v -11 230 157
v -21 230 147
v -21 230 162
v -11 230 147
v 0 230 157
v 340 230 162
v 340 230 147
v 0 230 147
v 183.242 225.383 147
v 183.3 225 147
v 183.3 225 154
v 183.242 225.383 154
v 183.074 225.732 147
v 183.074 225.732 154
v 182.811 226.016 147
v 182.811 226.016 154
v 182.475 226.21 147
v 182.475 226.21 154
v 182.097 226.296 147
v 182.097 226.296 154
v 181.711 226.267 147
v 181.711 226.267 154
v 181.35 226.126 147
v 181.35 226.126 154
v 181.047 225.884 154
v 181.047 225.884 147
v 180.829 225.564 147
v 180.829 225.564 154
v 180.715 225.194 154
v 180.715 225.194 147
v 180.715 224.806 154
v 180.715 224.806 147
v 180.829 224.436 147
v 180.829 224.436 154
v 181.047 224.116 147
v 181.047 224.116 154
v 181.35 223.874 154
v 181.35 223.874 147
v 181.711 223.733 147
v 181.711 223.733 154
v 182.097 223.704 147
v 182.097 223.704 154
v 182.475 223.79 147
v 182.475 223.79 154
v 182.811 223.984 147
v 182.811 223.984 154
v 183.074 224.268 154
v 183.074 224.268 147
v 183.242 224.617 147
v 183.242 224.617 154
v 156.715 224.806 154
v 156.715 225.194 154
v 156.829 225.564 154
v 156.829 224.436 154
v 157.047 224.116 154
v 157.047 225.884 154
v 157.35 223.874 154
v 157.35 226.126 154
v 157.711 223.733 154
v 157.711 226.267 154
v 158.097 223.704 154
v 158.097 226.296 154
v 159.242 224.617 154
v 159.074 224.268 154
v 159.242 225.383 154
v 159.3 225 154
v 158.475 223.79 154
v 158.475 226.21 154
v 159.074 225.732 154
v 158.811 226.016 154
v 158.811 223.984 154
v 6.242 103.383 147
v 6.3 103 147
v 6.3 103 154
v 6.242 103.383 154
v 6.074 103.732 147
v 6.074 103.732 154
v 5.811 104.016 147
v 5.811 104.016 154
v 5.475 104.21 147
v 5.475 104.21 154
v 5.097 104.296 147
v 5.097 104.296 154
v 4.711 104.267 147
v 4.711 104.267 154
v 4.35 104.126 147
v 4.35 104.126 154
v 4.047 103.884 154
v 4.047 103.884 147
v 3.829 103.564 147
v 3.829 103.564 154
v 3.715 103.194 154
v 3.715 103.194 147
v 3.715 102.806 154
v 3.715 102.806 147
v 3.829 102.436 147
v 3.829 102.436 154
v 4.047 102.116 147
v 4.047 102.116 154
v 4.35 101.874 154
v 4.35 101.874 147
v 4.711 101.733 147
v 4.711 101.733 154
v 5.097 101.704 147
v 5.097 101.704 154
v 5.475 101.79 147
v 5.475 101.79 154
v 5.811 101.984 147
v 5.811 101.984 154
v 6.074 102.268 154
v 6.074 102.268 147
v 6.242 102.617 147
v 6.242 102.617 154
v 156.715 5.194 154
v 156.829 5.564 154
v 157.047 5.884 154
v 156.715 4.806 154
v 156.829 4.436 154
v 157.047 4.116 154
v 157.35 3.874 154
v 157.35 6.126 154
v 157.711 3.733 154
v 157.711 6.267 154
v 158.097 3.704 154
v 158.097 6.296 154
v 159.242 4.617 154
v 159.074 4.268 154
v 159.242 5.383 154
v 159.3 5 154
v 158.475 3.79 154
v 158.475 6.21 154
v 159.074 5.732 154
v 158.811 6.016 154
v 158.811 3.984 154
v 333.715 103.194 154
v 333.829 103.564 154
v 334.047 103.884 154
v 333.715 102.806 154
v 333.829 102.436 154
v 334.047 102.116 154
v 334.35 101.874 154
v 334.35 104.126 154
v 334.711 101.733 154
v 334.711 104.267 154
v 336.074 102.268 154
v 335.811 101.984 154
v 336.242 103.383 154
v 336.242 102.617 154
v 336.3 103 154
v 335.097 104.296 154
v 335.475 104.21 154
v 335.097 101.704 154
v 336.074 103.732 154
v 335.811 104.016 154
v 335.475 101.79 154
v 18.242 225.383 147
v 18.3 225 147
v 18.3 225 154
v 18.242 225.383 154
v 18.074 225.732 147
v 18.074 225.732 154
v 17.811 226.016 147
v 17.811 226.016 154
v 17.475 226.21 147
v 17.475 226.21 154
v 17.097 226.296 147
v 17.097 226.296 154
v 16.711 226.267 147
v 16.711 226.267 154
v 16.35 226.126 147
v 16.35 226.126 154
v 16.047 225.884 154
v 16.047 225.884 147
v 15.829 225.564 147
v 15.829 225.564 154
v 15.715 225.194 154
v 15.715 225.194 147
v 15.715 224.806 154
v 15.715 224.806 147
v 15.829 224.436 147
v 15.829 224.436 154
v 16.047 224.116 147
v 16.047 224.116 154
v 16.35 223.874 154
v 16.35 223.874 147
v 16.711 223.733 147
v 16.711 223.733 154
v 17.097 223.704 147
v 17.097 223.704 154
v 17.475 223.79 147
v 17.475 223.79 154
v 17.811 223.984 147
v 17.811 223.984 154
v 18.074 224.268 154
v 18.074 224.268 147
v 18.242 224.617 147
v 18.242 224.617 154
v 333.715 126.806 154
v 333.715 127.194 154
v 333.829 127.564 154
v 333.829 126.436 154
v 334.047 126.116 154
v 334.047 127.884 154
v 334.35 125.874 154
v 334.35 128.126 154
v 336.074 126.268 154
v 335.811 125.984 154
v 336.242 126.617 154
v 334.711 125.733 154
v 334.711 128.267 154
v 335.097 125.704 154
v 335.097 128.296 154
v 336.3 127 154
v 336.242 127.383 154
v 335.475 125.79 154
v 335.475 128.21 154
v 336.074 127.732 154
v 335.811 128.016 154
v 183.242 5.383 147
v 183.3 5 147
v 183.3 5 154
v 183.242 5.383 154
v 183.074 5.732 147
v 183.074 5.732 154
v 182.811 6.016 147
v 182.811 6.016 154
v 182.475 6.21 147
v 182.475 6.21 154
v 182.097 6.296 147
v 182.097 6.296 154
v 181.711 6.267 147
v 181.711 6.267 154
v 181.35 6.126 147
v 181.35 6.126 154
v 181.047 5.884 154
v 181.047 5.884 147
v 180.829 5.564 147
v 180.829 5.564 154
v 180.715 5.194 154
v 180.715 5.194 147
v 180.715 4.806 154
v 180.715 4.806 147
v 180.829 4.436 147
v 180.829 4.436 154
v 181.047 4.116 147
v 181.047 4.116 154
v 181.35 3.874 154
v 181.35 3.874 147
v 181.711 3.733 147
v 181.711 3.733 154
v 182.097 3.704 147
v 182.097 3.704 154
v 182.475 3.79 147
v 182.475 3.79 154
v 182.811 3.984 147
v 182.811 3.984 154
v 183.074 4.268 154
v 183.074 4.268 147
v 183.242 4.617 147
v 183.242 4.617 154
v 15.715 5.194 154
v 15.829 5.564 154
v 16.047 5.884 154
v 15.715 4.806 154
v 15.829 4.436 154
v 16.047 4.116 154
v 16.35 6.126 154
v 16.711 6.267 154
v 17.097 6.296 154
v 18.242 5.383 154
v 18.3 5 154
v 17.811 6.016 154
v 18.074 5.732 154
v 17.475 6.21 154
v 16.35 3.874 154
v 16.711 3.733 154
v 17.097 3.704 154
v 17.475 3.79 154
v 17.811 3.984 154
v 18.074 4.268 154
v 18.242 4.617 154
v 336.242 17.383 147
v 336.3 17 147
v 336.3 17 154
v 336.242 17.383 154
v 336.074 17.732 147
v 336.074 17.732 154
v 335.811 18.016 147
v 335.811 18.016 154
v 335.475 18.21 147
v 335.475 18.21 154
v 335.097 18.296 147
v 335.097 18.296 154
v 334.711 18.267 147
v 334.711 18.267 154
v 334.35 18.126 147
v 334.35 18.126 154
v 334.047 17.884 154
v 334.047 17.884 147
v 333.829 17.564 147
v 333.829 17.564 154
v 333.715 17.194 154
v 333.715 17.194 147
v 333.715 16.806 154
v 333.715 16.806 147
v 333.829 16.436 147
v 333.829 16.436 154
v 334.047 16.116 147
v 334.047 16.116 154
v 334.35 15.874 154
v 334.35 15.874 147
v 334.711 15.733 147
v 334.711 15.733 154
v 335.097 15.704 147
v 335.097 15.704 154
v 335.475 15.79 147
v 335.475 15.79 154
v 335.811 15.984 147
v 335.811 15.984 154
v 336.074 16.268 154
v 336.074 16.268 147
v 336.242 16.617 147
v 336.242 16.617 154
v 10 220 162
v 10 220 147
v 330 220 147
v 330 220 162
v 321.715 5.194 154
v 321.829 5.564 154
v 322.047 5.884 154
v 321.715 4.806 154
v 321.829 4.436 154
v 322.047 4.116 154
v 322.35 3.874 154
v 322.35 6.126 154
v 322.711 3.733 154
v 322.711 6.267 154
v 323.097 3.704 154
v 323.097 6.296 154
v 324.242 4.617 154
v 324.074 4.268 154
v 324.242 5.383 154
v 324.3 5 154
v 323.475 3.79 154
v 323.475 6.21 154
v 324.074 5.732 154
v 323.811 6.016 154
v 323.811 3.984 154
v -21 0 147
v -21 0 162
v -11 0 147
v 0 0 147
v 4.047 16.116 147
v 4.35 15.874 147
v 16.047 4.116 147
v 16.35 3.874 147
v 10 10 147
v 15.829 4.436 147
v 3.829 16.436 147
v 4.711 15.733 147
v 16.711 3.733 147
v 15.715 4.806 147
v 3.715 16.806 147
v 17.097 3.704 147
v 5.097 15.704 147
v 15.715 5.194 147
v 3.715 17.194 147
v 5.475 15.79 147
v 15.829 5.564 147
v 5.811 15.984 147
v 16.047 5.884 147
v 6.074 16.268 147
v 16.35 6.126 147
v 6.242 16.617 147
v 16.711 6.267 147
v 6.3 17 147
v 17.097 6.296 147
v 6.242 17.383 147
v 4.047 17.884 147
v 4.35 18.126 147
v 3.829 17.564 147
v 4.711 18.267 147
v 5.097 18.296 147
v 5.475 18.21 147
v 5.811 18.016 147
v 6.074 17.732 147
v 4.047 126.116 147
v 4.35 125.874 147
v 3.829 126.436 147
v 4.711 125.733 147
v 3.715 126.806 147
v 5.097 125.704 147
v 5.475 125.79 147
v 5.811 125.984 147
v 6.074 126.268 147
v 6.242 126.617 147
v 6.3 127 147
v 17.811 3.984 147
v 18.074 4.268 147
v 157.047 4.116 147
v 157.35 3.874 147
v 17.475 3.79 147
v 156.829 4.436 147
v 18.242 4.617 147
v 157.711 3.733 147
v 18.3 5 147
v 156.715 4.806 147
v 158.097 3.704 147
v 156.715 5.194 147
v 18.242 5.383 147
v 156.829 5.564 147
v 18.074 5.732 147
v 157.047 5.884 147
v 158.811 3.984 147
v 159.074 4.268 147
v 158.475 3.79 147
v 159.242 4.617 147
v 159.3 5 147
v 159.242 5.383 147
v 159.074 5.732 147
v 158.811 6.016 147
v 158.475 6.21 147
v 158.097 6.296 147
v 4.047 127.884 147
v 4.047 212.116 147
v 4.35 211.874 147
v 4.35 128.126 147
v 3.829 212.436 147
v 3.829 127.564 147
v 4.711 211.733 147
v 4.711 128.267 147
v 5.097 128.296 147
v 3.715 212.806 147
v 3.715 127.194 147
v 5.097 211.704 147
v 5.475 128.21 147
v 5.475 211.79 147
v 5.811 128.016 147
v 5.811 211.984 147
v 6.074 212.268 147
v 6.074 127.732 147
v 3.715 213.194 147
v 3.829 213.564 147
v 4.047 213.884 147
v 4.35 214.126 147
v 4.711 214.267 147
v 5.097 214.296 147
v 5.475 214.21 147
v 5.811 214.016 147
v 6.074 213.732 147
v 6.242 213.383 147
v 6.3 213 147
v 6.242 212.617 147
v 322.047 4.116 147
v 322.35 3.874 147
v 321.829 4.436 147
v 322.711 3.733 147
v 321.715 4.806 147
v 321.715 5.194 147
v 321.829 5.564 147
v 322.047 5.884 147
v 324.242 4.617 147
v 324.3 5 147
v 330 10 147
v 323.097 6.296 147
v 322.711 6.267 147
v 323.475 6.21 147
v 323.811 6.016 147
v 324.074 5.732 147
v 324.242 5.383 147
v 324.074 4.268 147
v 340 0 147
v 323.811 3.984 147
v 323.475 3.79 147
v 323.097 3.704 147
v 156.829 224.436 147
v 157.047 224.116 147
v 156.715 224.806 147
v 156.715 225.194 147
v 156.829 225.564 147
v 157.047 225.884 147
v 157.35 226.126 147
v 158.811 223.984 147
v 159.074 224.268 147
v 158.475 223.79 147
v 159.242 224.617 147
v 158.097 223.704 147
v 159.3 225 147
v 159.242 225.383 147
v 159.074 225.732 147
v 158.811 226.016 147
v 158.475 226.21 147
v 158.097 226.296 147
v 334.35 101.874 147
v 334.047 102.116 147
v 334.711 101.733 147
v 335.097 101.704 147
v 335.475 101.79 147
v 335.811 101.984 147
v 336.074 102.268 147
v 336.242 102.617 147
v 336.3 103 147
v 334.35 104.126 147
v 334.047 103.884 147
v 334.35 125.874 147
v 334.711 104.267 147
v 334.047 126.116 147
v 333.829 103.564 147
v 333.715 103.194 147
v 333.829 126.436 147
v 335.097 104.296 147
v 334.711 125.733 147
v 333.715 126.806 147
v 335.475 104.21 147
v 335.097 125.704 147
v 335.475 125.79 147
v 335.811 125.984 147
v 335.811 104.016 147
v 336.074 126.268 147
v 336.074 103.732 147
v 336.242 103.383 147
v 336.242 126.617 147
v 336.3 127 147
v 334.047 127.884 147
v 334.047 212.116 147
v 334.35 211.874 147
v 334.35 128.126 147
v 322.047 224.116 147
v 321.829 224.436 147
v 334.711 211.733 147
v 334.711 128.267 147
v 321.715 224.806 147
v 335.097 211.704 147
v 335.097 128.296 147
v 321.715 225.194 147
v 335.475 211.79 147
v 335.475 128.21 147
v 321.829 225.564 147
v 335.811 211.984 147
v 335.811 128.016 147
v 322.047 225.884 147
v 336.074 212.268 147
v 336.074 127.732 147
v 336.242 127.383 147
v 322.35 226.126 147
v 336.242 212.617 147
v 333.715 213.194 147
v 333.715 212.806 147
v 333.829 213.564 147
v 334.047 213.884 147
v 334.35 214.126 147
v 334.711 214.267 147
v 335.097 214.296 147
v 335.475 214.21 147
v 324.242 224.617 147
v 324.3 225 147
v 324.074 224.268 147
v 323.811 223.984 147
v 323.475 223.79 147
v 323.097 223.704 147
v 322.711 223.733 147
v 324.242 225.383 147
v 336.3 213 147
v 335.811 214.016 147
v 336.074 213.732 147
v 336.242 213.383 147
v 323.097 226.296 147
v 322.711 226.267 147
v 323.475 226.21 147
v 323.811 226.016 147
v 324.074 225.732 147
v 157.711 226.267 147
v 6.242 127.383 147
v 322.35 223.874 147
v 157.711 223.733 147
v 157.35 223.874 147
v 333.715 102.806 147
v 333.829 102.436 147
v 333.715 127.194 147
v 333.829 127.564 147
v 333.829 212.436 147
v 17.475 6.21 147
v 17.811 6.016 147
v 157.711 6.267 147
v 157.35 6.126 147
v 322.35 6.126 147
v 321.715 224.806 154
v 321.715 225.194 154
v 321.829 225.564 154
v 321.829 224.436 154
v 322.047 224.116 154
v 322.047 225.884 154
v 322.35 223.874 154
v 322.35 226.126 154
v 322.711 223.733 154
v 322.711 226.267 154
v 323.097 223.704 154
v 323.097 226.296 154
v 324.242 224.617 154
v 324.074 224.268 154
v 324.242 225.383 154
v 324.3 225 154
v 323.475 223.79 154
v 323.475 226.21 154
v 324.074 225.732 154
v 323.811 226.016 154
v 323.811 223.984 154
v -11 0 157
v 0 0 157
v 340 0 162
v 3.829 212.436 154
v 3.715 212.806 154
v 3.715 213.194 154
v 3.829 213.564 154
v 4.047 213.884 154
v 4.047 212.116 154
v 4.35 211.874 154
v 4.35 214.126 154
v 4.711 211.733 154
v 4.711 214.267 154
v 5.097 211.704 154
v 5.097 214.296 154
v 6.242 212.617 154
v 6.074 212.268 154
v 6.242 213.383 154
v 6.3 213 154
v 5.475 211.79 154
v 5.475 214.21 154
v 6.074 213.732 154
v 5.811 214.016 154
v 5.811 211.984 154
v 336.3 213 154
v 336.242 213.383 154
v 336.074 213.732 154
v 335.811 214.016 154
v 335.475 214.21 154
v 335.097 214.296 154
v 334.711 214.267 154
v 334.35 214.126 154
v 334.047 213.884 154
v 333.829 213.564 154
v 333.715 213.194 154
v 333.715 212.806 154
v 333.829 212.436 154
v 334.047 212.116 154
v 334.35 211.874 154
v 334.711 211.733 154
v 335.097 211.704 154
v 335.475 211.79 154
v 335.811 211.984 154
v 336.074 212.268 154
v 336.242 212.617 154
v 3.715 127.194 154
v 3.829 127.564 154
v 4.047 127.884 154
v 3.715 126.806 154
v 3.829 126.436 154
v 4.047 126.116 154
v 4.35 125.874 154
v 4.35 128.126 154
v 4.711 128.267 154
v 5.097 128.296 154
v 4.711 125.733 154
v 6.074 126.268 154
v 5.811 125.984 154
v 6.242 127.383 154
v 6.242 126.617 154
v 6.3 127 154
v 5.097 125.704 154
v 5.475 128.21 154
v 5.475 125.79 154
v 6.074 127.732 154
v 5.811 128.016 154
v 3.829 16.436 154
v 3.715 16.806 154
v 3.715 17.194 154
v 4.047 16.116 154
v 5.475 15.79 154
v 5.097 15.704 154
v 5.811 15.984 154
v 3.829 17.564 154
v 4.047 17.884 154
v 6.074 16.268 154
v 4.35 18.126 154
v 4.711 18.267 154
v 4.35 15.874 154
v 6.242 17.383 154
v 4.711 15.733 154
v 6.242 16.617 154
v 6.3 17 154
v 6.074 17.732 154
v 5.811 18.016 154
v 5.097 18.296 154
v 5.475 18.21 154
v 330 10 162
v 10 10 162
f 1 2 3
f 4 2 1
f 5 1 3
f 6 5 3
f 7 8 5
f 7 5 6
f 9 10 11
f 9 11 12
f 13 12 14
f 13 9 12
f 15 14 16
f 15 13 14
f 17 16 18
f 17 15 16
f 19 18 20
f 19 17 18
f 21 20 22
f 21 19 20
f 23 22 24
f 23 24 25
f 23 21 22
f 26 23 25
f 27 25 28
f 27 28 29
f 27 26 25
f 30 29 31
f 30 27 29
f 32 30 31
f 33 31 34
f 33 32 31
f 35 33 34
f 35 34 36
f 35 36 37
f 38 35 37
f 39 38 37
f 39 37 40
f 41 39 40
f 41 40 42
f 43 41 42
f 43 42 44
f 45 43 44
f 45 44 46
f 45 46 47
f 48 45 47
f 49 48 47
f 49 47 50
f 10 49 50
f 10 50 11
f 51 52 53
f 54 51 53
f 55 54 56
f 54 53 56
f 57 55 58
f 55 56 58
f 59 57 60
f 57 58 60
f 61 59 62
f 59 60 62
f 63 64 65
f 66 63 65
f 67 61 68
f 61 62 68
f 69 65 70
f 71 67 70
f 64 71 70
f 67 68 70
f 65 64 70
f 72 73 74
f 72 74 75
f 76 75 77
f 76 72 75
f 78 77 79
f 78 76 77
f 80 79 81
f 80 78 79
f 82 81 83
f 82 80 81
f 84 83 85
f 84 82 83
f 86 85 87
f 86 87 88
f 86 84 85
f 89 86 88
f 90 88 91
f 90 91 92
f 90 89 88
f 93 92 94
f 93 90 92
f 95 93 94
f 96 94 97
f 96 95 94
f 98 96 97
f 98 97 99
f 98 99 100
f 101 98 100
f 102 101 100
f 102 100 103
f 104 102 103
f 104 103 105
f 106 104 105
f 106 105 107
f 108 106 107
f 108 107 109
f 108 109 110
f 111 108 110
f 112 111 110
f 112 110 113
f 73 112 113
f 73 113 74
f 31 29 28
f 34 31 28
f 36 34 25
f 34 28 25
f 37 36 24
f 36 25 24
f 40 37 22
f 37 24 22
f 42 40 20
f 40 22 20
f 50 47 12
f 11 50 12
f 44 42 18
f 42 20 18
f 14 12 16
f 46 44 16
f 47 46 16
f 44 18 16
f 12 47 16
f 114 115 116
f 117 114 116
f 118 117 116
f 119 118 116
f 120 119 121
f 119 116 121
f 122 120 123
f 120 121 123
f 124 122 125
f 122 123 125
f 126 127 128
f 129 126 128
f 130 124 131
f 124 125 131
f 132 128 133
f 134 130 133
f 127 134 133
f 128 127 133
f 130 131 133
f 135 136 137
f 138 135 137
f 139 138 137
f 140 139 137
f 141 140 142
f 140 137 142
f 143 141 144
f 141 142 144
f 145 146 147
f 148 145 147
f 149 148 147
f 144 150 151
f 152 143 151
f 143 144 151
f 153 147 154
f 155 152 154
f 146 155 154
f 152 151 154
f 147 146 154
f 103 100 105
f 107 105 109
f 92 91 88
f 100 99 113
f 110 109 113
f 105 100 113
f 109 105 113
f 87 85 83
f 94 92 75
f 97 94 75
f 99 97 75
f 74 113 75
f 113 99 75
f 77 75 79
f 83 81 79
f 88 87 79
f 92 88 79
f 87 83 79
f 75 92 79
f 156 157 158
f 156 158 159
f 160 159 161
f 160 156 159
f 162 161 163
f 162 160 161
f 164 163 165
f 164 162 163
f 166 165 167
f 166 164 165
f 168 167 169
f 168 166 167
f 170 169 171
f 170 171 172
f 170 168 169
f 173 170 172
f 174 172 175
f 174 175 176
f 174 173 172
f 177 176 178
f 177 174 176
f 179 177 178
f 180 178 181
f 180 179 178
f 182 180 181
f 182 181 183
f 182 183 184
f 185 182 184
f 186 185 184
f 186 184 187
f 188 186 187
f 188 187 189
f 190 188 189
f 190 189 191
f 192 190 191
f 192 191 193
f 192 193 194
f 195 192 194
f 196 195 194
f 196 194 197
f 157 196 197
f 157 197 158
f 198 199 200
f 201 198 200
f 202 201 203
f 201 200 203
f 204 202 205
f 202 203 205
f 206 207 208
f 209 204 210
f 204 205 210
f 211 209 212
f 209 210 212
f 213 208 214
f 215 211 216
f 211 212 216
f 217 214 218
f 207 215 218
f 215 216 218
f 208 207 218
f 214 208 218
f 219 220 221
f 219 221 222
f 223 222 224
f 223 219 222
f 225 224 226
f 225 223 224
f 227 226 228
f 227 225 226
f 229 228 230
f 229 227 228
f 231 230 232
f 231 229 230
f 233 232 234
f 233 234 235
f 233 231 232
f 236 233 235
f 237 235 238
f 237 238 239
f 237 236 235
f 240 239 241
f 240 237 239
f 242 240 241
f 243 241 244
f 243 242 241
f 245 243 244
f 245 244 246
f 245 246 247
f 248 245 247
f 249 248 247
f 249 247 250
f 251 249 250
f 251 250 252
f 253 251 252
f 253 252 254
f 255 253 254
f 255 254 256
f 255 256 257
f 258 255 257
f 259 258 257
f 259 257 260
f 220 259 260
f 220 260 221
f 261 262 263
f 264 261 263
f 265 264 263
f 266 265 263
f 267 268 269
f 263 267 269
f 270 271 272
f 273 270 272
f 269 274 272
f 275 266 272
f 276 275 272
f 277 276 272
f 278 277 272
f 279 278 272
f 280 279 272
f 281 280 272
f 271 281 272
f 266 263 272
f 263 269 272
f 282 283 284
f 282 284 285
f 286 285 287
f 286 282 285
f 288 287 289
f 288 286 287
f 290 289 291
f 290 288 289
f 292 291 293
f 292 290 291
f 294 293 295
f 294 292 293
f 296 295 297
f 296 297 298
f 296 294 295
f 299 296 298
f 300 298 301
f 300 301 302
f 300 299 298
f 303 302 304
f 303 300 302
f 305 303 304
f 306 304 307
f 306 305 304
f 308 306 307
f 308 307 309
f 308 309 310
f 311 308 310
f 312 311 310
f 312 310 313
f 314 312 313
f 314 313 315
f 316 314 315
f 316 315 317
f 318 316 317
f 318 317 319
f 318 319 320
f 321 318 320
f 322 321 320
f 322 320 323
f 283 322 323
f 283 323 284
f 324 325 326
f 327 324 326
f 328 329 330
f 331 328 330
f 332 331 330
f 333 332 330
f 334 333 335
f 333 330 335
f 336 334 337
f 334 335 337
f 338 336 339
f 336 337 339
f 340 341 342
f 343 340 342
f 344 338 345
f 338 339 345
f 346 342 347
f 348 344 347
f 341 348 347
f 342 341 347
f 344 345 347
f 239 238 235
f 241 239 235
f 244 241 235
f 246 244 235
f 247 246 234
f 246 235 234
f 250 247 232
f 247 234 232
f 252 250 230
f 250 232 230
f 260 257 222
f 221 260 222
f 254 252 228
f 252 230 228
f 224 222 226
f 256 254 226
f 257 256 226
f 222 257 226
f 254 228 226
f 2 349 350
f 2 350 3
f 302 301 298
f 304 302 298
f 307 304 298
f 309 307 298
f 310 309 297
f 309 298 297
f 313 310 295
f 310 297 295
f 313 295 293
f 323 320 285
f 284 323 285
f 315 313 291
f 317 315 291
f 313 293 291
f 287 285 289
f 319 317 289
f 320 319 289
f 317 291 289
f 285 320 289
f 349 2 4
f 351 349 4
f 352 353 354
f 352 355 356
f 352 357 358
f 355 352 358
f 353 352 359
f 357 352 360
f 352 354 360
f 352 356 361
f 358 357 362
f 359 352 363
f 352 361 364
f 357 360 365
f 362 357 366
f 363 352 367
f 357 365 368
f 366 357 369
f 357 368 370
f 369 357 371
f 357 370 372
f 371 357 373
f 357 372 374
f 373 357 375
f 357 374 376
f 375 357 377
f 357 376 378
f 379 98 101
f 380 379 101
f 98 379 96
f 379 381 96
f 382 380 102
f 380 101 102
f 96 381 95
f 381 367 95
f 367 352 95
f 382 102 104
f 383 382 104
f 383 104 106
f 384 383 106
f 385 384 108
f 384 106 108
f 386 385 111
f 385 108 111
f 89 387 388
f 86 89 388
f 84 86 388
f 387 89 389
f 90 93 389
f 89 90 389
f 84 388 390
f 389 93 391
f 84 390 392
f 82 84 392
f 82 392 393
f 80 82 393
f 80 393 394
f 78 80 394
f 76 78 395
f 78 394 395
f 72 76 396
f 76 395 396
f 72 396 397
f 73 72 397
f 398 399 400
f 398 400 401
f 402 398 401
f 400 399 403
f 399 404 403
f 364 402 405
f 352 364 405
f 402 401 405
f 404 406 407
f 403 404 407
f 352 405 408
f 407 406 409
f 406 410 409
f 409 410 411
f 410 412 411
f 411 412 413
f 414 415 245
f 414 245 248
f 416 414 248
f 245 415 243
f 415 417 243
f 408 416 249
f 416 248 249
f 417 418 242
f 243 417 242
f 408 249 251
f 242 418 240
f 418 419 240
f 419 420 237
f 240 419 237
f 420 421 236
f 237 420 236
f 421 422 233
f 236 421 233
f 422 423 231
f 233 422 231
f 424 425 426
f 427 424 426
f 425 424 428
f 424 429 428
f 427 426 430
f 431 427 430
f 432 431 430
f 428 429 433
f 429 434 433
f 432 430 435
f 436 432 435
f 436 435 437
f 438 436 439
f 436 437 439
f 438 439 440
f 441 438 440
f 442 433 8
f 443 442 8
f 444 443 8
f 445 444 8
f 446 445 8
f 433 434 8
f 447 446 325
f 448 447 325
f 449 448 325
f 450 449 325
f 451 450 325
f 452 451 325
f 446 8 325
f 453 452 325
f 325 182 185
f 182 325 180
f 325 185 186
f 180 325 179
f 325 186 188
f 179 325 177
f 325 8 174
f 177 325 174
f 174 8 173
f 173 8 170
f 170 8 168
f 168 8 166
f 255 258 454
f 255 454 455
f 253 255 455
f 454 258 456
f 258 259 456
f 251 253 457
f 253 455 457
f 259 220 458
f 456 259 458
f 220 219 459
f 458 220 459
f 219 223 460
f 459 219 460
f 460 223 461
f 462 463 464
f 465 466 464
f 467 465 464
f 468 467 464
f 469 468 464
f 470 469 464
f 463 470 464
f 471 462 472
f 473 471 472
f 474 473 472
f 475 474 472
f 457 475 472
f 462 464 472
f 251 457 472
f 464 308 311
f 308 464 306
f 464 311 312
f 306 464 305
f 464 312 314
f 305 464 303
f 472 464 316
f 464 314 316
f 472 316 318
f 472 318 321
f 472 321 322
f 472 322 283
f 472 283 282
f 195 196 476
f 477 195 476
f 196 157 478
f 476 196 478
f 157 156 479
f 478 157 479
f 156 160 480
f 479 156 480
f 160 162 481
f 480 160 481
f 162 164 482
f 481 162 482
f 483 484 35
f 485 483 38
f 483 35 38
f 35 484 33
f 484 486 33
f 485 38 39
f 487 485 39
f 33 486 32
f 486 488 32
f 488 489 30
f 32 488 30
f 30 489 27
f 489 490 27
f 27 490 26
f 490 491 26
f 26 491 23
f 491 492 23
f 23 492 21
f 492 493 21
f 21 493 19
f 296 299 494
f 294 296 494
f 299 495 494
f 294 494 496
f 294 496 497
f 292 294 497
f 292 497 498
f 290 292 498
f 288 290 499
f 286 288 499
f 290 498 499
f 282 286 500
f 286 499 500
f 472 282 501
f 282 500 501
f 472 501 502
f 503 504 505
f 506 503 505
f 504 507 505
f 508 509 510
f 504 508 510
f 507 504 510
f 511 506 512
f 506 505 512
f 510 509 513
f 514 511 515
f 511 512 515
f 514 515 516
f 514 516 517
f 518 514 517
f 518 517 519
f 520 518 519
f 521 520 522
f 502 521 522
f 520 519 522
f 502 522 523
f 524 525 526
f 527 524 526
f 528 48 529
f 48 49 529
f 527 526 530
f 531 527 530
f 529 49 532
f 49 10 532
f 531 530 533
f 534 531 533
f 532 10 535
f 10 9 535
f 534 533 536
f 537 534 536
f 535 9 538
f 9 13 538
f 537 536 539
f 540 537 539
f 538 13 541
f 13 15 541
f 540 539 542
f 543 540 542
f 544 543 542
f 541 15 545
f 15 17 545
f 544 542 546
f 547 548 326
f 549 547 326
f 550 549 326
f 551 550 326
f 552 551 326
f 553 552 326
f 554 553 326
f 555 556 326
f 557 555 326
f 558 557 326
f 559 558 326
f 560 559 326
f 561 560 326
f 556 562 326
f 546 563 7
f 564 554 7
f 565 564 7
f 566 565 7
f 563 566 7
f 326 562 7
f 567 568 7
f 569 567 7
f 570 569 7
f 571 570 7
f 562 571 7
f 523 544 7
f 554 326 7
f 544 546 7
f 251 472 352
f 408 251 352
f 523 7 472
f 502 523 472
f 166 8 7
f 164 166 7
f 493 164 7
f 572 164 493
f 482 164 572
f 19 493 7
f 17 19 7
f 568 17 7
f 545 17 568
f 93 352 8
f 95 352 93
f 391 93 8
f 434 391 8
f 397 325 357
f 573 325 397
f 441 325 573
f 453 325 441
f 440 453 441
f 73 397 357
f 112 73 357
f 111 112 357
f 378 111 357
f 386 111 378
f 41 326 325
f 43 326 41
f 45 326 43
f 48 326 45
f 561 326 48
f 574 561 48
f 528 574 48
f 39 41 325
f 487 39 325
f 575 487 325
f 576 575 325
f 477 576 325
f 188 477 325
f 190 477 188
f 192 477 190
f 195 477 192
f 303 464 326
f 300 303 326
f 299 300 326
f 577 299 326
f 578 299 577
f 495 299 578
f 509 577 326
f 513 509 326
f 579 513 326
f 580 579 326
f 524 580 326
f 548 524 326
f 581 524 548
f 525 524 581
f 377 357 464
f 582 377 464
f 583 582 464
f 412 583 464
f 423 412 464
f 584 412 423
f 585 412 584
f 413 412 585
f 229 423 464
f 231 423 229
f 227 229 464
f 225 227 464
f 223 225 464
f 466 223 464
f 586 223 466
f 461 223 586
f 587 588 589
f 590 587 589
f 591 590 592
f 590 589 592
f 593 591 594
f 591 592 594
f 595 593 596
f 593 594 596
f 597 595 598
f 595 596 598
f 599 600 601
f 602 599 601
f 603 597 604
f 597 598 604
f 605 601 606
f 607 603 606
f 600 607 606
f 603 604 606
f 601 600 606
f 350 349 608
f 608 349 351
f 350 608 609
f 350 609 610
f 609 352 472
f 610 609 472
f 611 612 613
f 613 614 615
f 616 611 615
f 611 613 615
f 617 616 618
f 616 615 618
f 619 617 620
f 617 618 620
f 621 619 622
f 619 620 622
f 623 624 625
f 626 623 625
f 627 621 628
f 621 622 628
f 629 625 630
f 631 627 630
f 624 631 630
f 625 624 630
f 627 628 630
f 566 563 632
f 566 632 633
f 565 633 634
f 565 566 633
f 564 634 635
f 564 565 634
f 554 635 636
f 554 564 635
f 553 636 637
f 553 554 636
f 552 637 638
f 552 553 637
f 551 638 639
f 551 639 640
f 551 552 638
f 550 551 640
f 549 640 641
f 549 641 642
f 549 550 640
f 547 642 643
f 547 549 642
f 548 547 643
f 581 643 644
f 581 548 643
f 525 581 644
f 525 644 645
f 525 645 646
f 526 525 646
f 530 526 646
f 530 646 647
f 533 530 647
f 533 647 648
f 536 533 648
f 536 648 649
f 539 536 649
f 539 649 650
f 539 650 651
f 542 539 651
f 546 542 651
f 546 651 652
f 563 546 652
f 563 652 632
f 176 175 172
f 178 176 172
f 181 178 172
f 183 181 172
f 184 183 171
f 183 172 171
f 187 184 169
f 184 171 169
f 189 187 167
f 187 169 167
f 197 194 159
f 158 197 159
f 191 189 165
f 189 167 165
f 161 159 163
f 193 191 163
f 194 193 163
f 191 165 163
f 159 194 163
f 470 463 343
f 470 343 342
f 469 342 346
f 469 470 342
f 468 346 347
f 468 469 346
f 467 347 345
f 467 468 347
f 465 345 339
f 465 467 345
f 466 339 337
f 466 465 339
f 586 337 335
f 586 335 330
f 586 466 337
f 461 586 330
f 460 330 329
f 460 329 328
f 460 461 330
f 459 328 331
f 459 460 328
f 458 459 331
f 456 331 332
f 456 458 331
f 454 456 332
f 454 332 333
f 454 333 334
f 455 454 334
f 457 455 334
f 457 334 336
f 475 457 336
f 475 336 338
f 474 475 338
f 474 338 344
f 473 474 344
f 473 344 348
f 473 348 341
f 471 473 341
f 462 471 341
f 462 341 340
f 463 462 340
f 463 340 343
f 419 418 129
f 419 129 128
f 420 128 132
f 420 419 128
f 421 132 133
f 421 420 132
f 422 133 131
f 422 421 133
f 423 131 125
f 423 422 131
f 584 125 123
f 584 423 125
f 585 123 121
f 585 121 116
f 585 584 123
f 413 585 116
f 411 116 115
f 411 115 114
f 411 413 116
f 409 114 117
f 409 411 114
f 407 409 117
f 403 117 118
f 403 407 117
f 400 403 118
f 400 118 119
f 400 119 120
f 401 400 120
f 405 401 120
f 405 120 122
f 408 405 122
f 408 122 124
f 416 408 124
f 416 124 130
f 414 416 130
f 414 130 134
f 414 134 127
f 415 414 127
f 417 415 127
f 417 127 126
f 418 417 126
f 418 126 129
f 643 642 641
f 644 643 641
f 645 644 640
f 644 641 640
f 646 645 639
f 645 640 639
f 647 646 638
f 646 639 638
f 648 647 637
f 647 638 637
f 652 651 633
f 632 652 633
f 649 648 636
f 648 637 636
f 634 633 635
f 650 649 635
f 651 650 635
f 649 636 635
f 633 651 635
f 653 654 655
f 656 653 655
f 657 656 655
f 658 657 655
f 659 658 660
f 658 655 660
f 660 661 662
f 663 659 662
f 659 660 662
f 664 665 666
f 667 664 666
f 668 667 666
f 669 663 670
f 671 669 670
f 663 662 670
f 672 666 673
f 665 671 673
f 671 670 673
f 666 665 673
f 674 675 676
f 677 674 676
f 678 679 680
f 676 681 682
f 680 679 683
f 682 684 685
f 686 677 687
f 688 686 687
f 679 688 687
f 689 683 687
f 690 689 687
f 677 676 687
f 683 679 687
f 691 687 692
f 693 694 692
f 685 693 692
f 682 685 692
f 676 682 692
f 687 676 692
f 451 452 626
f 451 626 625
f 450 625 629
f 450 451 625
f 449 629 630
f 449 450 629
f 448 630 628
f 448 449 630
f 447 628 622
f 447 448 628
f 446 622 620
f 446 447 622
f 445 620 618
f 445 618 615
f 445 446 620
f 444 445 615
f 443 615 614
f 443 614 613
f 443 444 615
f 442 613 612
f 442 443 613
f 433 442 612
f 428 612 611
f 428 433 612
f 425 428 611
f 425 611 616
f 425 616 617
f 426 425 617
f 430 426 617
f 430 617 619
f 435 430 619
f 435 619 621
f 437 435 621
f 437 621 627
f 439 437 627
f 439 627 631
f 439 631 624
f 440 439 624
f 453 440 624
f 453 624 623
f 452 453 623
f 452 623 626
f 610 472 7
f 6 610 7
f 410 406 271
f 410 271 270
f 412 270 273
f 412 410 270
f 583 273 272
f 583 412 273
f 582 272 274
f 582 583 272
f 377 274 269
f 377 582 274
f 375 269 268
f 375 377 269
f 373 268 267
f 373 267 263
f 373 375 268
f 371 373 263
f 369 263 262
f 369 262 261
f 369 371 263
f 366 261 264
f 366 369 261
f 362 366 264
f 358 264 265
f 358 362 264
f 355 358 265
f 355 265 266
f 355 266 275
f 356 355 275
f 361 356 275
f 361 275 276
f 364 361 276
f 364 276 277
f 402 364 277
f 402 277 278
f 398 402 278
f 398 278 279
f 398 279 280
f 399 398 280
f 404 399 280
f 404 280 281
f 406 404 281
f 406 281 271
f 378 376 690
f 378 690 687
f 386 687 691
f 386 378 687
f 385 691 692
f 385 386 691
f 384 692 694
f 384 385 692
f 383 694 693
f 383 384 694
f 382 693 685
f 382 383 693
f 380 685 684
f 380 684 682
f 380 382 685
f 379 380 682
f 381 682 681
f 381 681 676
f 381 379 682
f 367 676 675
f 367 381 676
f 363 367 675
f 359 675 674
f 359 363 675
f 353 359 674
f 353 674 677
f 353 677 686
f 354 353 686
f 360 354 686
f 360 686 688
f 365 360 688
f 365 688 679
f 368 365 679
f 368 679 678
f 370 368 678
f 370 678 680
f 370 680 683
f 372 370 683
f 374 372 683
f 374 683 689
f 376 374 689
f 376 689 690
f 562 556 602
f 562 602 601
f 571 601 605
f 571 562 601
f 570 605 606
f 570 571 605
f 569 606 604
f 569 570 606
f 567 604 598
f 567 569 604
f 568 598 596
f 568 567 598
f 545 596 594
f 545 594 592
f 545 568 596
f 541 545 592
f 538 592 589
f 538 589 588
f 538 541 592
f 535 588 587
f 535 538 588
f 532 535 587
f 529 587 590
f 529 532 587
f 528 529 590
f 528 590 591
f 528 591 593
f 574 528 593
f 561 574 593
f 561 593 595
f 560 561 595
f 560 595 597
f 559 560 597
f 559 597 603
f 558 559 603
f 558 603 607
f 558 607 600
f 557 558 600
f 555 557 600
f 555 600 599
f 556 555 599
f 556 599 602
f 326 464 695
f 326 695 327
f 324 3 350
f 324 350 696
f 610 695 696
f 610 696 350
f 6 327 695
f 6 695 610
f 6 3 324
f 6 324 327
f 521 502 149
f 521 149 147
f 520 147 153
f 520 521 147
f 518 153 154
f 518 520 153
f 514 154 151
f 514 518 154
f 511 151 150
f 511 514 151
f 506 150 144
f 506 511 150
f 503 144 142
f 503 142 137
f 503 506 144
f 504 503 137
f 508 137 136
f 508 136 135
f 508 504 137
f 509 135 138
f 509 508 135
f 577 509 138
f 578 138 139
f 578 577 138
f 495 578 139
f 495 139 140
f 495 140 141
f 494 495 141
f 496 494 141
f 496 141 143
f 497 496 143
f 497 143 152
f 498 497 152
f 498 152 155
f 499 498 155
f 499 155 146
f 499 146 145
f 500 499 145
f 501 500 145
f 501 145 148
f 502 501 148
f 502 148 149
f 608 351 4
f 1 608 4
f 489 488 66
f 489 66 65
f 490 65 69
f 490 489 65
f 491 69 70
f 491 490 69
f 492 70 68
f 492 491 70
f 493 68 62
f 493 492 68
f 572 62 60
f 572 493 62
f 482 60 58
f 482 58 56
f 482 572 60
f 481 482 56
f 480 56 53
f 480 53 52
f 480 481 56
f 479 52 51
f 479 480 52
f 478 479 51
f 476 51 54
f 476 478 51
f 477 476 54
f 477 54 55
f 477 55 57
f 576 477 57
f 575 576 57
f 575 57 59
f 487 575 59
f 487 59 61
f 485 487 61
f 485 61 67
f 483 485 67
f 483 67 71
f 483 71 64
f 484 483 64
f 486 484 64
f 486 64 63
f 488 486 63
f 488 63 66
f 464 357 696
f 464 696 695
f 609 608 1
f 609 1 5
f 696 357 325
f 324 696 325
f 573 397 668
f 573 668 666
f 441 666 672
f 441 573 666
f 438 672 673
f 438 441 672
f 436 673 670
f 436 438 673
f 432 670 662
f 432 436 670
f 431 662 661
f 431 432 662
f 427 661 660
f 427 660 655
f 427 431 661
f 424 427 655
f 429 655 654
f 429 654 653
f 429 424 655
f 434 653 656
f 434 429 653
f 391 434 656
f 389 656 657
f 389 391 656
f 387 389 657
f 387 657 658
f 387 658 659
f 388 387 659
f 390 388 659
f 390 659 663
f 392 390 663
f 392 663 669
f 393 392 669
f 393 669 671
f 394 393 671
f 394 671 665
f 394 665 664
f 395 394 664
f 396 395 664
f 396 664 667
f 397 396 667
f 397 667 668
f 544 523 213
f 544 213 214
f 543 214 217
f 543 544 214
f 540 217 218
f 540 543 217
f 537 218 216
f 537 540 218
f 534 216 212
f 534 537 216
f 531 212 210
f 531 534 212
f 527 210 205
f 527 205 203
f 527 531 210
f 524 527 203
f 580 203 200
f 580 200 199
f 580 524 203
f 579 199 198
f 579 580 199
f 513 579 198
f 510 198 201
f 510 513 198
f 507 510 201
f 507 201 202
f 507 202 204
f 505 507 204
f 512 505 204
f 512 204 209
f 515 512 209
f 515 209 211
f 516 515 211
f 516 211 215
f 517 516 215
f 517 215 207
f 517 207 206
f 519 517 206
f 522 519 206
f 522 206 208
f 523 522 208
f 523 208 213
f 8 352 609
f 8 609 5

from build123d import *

# Parameters (mm, degrees)
CYLINDER047_R     = 1.3
CYLINDER047_DEPTH = 146
CYLINDER045_R     = 1.3
CYLINDER045_DEPTH = 146
CYLINDER043_R     = 1.3
CYLINDER043_DEPTH = 146
CYLINDER040_R     = 1.3
CYLINDER040_DEPTH = 146
CYLINDER039_R     = 1.3
CYLINDER039_DEPTH = 146
CYLINDER036_R     = 1.3
CYLINDER036_DEPTH = 146
CYLINDER034_R     = 1.3
CYLINDER034_DEPTH = 146
CYLINDER032_R     = 1.3
CYLINDER032_DEPTH = 146
CYLINDER030_R     = 1.3
CYLINDER030_DEPTH = 146
CYLINDER018_R     = 1.3
CYLINDER018_DEPTH = 146
CYLINDER017_R     = 1.3
CYLINDER017_DEPTH = 146
CYLINDER012_R     = 1.3
CYLINDER012_DEPTH = 146
CYLINDER011_R     = 1.3
CYLINDER011_DEPTH = 146
CYLINDER009_R     = 1.3
CYLINDER009_DEPTH = 146
CYLINDER002_R     = 1.3
CYLINDER002_DEPTH = 146
CYLINDER001_R     = 1.3
CYLINDER001_DEPTH = 146
BOX046_W          = 10
BOX046_H          = 230
BOX046_DEPTH      = 10
BOX041_W          = 10
BOX041_H          = 210
BOX041_DEPTH      = 15
BOX040_W          = 340
BOX040_H          = 10
BOX040_DEPTH      = 15
BOX024_W          = 10
BOX024_H          = 210
BOX024_DEPTH      = 15
BOX042_W          = 340
BOX042_H          = 10
BOX042_DEPTH      = 15
BOX045_W          = 21
BOX045_H          = 230
BOX045_DEPTH      = 5


with BuildPart() as cilindro047:
    # Cylinder047 → Cylinder047 (new body)
    with BuildSketch(Plane(origin=(5, 103, 8), x_dir=(1, 0, 0), z_dir=(0, 0, 1))):
        Circle(CYLINDER047_R)
    extrude(amount=CYLINDER047_DEPTH)


with BuildPart() as cilindro045:
    # Cylinder045 → Cylinder045 (new body)
    with BuildSketch(Plane(origin=(5, 127, 8), x_dir=(1, 0, 0), z_dir=(0, 0, 1))):
        Circle(CYLINDER045_R)
    extrude(amount=CYLINDER045_DEPTH)


with BuildPart() as cilindro043:
    # Cylinder043 → Cylinder043 (new body)
    with BuildSketch(Plane(origin=(5, 213, 8), x_dir=(1, 0, 0), z_dir=(0, 0, 1))):
        Circle(CYLINDER043_R)
    extrude(amount=CYLINDER043_DEPTH)


with BuildPart() as cilindro040:
    # Cylinder040 → Cylinder040 (new body)
    with BuildSketch(Plane(origin=(17, 225, 8), x_dir=(1, 0, 0), z_dir=(0, 0, 1))):
        Circle(CYLINDER040_R)
    extrude(amount=CYLINDER040_DEPTH)


with BuildPart() as cilindro039:
    # Cylinder039 → Cylinder039 (new body)
    with BuildSketch(Plane(origin=(158, 225, 8), x_dir=(1, 0, 0), z_dir=(0, 0, 1))):
        Circle(CYLINDER039_R)
    extrude(amount=CYLINDER039_DEPTH)


with BuildPart() as cilindro036:
    # Cylinder036 → Cylinder036 (new body)
    with BuildSketch(Plane(origin=(182, 225, 8), x_dir=(1, 0, 0), z_dir=(0, 0, 1))):
        Circle(CYLINDER036_R)
    extrude(amount=CYLINDER036_DEPTH)


with BuildPart() as cilindro034:
    # Cylinder034 → Cylinder034 (new body)
    with BuildSketch(Plane(origin=(323, 225, 8), x_dir=(1, 0, 0), z_dir=(0, 0, 1))):
        Circle(CYLINDER034_R)
    extrude(amount=CYLINDER034_DEPTH)


with BuildPart() as cilindro032:
    # Cylinder032 → Cylinder032 (new body)
    with BuildSketch(Plane(origin=(335, 213, 8), x_dir=(1, 0, 0), z_dir=(0, 0, 1))):
        Circle(CYLINDER032_R)
    extrude(amount=CYLINDER032_DEPTH)


with BuildPart() as cilindro030:
    # Cylinder030 → Cylinder030 (new body)
    with BuildSketch(Plane(origin=(335, 127, 8), x_dir=(1, 0, 0), z_dir=(0, 0, 1))):
        Circle(CYLINDER030_R)
    extrude(amount=CYLINDER030_DEPTH)


with BuildPart() as cilindro018:
    # Cylinder018 → Cylinder018 (new body)
    with BuildSketch(Plane(origin=(335, 103, 8), x_dir=(1, 0, 0), z_dir=(0, 0, 1))):
        Circle(CYLINDER018_R)
    extrude(amount=CYLINDER018_DEPTH)


with BuildPart() as cilindro017:
    # Cylinder017 → Cylinder017 (new body)
    with BuildSketch(Plane(origin=(335, 17, 8), x_dir=(1, 0, 0), z_dir=(0, 0, 1))):
        Circle(CYLINDER017_R)
    extrude(amount=CYLINDER017_DEPTH)


with BuildPart() as cilindro012:
    # Cylinder012 → Cylinder012 (new body)
    with BuildSketch(Plane(origin=(323, 5, 8), x_dir=(1, 0, 0), z_dir=(0, 0, 1))):
        Circle(CYLINDER012_R)
    extrude(amount=CYLINDER012_DEPTH)


with BuildPart() as cilindro011:
    # Cylinder011 → Cylinder011 (new body)
    with BuildSketch(Plane(origin=(182, 5, 8), x_dir=(1, 0, 0), z_dir=(0, 0, 1))):
        Circle(CYLINDER011_R)
    extrude(amount=CYLINDER011_DEPTH)


with BuildPart() as cilindro009:
    # Cylinder009 → Cylinder009 (new body)
    with BuildSketch(Plane(origin=(158, 5, 8), x_dir=(1, 0, 0), z_dir=(0, 0, 1))):
        Circle(CYLINDER009_R)
    extrude(amount=CYLINDER009_DEPTH)


with BuildPart() as cilindro002:
    # Cylinder002 → Cylinder002 (new body)
    with BuildSketch(Plane(origin=(5, 17, 8), x_dir=(1, 0, 0), z_dir=(0, 0, 1))):
        Circle(CYLINDER002_R)
    extrude(amount=CYLINDER002_DEPTH)


with BuildPart() as cilindro001:
    # Cylinder001 → Cylinder001 (new body)
    with BuildSketch(Plane(origin=(17, 5, 8), x_dir=(1, 0, 0), z_dir=(0, 0, 1))):
        Circle(CYLINDER001_R)
    extrude(amount=CYLINDER001_DEPTH)


with BuildPart() as cubo009:
    # Box046 → Box046 (new body)
    with BuildSketch(Plane(origin=(-21, 249, 0), x_dir=(1, 0, 0), z_dir=(0, 0, 1))):
        with Locations((5, 115)):
            Rectangle(BOX046_W, BOX046_H)
    extrude(amount=BOX046_DEPTH)


with BuildPart() as cubo004:
    # Box041 → Box041 (new body)
    with BuildSketch(Plane(origin=(330, 259, 0), x_dir=(1, 0, 0), z_dir=(0, 0, 1))):
        with Locations((5, 105)):
            Rectangle(BOX041_W, BOX041_H)
    extrude(amount=BOX041_DEPTH)


with BuildPart() as cubo003:
    # Box040 → Box040 (new body)
    with BuildSketch(Plane(origin=(0, 249, 0), x_dir=(1, 0, 0), z_dir=(0, 0, 1))):
        with Locations((170, 5)):
            Rectangle(BOX040_W, BOX040_H)
    extrude(amount=BOX040_DEPTH)


with BuildPart() as cubo002:
    # Box024 → Box024 (new body)
    with BuildSketch(Plane(origin=(0, 259, 0), x_dir=(1, 0, 0), z_dir=(0, 0, 1))):
        with Locations((5, 105)):
            Rectangle(BOX024_W, BOX024_H)
    extrude(amount=BOX024_DEPTH)


with BuildPart() as techo:
    # Box042 → Box042 (new body)
    with BuildSketch(Plane(origin=(0, 469, 0), x_dir=(1, 0, 0), z_dir=(0, 0, 1))):
        with Locations((170, 5)):
            Rectangle(BOX042_W, BOX042_H)
    extrude(amount=BOX042_DEPTH)

    # Fusion004: union Cubo004, Cubo003, Cubo002
    add(cubo004.part)
    add(cubo003.part)
    add(cubo002.part)


with BuildPart() as cut062:
    # Box045 → Box045 (new body)
    with BuildSketch(Plane(origin=(-21, 249, 10), x_dir=(1, 0, 0), z_dir=(0, 0, 1))):
        with Locations((10.5, 115)):
            Rectangle(BOX045_W, BOX045_H)
    extrude(amount=BOX045_DEPTH)

    # Fusion005: union Cubo009, techo
    add(cubo009.part)
    add(techo.part)


with BuildPart() as cut062_1:
    # Fusion005 placement: moved
    add(cut062.part.moved(Location((0, -249, 147))))

    # Cut016: cut Cilindro001
    add(cilindro001.part, mode=Mode.SUBTRACT)

    # Cut017: cut Cilindro002
    add(cilindro002.part, mode=Mode.SUBTRACT)

    # Cut023: cut Cilindro009
    add(cilindro009.part, mode=Mode.SUBTRACT)

    # Cut026: cut Cilindro011
    add(cilindro011.part, mode=Mode.SUBTRACT)

    # Cut029: cut Cilindro012
    add(cilindro012.part, mode=Mode.SUBTRACT)

    # Cut032: cut Cilindro017
    add(cilindro017.part, mode=Mode.SUBTRACT)

    # Cut043: cut Cilindro018
    add(cilindro018.part, mode=Mode.SUBTRACT)

    # Cut045: cut Cilindro030
    add(cilindro030.part, mode=Mode.SUBTRACT)

    # Cut047: cut Cilindro032
    add(cilindro032.part, mode=Mode.SUBTRACT)

    # Cut049: cut Cilindro034
    add(cilindro034.part, mode=Mode.SUBTRACT)

    # Cut051: cut Cilindro036
    add(cilindro036.part, mode=Mode.SUBTRACT)

    # Cut054: cut Cilindro039
    add(cilindro039.part, mode=Mode.SUBTRACT)

    # Cut055: cut Cilindro040
    add(cilindro040.part, mode=Mode.SUBTRACT)

    # Cut058: cut Cilindro043
    add(cilindro043.part, mode=Mode.SUBTRACT)

    # Cut060: cut Cilindro045
    add(cilindro045.part, mode=Mode.SUBTRACT)

    # Cut062: cut Cilindro047
    add(cilindro047.part, mode=Mode.SUBTRACT)


solid = cut062_1.part
